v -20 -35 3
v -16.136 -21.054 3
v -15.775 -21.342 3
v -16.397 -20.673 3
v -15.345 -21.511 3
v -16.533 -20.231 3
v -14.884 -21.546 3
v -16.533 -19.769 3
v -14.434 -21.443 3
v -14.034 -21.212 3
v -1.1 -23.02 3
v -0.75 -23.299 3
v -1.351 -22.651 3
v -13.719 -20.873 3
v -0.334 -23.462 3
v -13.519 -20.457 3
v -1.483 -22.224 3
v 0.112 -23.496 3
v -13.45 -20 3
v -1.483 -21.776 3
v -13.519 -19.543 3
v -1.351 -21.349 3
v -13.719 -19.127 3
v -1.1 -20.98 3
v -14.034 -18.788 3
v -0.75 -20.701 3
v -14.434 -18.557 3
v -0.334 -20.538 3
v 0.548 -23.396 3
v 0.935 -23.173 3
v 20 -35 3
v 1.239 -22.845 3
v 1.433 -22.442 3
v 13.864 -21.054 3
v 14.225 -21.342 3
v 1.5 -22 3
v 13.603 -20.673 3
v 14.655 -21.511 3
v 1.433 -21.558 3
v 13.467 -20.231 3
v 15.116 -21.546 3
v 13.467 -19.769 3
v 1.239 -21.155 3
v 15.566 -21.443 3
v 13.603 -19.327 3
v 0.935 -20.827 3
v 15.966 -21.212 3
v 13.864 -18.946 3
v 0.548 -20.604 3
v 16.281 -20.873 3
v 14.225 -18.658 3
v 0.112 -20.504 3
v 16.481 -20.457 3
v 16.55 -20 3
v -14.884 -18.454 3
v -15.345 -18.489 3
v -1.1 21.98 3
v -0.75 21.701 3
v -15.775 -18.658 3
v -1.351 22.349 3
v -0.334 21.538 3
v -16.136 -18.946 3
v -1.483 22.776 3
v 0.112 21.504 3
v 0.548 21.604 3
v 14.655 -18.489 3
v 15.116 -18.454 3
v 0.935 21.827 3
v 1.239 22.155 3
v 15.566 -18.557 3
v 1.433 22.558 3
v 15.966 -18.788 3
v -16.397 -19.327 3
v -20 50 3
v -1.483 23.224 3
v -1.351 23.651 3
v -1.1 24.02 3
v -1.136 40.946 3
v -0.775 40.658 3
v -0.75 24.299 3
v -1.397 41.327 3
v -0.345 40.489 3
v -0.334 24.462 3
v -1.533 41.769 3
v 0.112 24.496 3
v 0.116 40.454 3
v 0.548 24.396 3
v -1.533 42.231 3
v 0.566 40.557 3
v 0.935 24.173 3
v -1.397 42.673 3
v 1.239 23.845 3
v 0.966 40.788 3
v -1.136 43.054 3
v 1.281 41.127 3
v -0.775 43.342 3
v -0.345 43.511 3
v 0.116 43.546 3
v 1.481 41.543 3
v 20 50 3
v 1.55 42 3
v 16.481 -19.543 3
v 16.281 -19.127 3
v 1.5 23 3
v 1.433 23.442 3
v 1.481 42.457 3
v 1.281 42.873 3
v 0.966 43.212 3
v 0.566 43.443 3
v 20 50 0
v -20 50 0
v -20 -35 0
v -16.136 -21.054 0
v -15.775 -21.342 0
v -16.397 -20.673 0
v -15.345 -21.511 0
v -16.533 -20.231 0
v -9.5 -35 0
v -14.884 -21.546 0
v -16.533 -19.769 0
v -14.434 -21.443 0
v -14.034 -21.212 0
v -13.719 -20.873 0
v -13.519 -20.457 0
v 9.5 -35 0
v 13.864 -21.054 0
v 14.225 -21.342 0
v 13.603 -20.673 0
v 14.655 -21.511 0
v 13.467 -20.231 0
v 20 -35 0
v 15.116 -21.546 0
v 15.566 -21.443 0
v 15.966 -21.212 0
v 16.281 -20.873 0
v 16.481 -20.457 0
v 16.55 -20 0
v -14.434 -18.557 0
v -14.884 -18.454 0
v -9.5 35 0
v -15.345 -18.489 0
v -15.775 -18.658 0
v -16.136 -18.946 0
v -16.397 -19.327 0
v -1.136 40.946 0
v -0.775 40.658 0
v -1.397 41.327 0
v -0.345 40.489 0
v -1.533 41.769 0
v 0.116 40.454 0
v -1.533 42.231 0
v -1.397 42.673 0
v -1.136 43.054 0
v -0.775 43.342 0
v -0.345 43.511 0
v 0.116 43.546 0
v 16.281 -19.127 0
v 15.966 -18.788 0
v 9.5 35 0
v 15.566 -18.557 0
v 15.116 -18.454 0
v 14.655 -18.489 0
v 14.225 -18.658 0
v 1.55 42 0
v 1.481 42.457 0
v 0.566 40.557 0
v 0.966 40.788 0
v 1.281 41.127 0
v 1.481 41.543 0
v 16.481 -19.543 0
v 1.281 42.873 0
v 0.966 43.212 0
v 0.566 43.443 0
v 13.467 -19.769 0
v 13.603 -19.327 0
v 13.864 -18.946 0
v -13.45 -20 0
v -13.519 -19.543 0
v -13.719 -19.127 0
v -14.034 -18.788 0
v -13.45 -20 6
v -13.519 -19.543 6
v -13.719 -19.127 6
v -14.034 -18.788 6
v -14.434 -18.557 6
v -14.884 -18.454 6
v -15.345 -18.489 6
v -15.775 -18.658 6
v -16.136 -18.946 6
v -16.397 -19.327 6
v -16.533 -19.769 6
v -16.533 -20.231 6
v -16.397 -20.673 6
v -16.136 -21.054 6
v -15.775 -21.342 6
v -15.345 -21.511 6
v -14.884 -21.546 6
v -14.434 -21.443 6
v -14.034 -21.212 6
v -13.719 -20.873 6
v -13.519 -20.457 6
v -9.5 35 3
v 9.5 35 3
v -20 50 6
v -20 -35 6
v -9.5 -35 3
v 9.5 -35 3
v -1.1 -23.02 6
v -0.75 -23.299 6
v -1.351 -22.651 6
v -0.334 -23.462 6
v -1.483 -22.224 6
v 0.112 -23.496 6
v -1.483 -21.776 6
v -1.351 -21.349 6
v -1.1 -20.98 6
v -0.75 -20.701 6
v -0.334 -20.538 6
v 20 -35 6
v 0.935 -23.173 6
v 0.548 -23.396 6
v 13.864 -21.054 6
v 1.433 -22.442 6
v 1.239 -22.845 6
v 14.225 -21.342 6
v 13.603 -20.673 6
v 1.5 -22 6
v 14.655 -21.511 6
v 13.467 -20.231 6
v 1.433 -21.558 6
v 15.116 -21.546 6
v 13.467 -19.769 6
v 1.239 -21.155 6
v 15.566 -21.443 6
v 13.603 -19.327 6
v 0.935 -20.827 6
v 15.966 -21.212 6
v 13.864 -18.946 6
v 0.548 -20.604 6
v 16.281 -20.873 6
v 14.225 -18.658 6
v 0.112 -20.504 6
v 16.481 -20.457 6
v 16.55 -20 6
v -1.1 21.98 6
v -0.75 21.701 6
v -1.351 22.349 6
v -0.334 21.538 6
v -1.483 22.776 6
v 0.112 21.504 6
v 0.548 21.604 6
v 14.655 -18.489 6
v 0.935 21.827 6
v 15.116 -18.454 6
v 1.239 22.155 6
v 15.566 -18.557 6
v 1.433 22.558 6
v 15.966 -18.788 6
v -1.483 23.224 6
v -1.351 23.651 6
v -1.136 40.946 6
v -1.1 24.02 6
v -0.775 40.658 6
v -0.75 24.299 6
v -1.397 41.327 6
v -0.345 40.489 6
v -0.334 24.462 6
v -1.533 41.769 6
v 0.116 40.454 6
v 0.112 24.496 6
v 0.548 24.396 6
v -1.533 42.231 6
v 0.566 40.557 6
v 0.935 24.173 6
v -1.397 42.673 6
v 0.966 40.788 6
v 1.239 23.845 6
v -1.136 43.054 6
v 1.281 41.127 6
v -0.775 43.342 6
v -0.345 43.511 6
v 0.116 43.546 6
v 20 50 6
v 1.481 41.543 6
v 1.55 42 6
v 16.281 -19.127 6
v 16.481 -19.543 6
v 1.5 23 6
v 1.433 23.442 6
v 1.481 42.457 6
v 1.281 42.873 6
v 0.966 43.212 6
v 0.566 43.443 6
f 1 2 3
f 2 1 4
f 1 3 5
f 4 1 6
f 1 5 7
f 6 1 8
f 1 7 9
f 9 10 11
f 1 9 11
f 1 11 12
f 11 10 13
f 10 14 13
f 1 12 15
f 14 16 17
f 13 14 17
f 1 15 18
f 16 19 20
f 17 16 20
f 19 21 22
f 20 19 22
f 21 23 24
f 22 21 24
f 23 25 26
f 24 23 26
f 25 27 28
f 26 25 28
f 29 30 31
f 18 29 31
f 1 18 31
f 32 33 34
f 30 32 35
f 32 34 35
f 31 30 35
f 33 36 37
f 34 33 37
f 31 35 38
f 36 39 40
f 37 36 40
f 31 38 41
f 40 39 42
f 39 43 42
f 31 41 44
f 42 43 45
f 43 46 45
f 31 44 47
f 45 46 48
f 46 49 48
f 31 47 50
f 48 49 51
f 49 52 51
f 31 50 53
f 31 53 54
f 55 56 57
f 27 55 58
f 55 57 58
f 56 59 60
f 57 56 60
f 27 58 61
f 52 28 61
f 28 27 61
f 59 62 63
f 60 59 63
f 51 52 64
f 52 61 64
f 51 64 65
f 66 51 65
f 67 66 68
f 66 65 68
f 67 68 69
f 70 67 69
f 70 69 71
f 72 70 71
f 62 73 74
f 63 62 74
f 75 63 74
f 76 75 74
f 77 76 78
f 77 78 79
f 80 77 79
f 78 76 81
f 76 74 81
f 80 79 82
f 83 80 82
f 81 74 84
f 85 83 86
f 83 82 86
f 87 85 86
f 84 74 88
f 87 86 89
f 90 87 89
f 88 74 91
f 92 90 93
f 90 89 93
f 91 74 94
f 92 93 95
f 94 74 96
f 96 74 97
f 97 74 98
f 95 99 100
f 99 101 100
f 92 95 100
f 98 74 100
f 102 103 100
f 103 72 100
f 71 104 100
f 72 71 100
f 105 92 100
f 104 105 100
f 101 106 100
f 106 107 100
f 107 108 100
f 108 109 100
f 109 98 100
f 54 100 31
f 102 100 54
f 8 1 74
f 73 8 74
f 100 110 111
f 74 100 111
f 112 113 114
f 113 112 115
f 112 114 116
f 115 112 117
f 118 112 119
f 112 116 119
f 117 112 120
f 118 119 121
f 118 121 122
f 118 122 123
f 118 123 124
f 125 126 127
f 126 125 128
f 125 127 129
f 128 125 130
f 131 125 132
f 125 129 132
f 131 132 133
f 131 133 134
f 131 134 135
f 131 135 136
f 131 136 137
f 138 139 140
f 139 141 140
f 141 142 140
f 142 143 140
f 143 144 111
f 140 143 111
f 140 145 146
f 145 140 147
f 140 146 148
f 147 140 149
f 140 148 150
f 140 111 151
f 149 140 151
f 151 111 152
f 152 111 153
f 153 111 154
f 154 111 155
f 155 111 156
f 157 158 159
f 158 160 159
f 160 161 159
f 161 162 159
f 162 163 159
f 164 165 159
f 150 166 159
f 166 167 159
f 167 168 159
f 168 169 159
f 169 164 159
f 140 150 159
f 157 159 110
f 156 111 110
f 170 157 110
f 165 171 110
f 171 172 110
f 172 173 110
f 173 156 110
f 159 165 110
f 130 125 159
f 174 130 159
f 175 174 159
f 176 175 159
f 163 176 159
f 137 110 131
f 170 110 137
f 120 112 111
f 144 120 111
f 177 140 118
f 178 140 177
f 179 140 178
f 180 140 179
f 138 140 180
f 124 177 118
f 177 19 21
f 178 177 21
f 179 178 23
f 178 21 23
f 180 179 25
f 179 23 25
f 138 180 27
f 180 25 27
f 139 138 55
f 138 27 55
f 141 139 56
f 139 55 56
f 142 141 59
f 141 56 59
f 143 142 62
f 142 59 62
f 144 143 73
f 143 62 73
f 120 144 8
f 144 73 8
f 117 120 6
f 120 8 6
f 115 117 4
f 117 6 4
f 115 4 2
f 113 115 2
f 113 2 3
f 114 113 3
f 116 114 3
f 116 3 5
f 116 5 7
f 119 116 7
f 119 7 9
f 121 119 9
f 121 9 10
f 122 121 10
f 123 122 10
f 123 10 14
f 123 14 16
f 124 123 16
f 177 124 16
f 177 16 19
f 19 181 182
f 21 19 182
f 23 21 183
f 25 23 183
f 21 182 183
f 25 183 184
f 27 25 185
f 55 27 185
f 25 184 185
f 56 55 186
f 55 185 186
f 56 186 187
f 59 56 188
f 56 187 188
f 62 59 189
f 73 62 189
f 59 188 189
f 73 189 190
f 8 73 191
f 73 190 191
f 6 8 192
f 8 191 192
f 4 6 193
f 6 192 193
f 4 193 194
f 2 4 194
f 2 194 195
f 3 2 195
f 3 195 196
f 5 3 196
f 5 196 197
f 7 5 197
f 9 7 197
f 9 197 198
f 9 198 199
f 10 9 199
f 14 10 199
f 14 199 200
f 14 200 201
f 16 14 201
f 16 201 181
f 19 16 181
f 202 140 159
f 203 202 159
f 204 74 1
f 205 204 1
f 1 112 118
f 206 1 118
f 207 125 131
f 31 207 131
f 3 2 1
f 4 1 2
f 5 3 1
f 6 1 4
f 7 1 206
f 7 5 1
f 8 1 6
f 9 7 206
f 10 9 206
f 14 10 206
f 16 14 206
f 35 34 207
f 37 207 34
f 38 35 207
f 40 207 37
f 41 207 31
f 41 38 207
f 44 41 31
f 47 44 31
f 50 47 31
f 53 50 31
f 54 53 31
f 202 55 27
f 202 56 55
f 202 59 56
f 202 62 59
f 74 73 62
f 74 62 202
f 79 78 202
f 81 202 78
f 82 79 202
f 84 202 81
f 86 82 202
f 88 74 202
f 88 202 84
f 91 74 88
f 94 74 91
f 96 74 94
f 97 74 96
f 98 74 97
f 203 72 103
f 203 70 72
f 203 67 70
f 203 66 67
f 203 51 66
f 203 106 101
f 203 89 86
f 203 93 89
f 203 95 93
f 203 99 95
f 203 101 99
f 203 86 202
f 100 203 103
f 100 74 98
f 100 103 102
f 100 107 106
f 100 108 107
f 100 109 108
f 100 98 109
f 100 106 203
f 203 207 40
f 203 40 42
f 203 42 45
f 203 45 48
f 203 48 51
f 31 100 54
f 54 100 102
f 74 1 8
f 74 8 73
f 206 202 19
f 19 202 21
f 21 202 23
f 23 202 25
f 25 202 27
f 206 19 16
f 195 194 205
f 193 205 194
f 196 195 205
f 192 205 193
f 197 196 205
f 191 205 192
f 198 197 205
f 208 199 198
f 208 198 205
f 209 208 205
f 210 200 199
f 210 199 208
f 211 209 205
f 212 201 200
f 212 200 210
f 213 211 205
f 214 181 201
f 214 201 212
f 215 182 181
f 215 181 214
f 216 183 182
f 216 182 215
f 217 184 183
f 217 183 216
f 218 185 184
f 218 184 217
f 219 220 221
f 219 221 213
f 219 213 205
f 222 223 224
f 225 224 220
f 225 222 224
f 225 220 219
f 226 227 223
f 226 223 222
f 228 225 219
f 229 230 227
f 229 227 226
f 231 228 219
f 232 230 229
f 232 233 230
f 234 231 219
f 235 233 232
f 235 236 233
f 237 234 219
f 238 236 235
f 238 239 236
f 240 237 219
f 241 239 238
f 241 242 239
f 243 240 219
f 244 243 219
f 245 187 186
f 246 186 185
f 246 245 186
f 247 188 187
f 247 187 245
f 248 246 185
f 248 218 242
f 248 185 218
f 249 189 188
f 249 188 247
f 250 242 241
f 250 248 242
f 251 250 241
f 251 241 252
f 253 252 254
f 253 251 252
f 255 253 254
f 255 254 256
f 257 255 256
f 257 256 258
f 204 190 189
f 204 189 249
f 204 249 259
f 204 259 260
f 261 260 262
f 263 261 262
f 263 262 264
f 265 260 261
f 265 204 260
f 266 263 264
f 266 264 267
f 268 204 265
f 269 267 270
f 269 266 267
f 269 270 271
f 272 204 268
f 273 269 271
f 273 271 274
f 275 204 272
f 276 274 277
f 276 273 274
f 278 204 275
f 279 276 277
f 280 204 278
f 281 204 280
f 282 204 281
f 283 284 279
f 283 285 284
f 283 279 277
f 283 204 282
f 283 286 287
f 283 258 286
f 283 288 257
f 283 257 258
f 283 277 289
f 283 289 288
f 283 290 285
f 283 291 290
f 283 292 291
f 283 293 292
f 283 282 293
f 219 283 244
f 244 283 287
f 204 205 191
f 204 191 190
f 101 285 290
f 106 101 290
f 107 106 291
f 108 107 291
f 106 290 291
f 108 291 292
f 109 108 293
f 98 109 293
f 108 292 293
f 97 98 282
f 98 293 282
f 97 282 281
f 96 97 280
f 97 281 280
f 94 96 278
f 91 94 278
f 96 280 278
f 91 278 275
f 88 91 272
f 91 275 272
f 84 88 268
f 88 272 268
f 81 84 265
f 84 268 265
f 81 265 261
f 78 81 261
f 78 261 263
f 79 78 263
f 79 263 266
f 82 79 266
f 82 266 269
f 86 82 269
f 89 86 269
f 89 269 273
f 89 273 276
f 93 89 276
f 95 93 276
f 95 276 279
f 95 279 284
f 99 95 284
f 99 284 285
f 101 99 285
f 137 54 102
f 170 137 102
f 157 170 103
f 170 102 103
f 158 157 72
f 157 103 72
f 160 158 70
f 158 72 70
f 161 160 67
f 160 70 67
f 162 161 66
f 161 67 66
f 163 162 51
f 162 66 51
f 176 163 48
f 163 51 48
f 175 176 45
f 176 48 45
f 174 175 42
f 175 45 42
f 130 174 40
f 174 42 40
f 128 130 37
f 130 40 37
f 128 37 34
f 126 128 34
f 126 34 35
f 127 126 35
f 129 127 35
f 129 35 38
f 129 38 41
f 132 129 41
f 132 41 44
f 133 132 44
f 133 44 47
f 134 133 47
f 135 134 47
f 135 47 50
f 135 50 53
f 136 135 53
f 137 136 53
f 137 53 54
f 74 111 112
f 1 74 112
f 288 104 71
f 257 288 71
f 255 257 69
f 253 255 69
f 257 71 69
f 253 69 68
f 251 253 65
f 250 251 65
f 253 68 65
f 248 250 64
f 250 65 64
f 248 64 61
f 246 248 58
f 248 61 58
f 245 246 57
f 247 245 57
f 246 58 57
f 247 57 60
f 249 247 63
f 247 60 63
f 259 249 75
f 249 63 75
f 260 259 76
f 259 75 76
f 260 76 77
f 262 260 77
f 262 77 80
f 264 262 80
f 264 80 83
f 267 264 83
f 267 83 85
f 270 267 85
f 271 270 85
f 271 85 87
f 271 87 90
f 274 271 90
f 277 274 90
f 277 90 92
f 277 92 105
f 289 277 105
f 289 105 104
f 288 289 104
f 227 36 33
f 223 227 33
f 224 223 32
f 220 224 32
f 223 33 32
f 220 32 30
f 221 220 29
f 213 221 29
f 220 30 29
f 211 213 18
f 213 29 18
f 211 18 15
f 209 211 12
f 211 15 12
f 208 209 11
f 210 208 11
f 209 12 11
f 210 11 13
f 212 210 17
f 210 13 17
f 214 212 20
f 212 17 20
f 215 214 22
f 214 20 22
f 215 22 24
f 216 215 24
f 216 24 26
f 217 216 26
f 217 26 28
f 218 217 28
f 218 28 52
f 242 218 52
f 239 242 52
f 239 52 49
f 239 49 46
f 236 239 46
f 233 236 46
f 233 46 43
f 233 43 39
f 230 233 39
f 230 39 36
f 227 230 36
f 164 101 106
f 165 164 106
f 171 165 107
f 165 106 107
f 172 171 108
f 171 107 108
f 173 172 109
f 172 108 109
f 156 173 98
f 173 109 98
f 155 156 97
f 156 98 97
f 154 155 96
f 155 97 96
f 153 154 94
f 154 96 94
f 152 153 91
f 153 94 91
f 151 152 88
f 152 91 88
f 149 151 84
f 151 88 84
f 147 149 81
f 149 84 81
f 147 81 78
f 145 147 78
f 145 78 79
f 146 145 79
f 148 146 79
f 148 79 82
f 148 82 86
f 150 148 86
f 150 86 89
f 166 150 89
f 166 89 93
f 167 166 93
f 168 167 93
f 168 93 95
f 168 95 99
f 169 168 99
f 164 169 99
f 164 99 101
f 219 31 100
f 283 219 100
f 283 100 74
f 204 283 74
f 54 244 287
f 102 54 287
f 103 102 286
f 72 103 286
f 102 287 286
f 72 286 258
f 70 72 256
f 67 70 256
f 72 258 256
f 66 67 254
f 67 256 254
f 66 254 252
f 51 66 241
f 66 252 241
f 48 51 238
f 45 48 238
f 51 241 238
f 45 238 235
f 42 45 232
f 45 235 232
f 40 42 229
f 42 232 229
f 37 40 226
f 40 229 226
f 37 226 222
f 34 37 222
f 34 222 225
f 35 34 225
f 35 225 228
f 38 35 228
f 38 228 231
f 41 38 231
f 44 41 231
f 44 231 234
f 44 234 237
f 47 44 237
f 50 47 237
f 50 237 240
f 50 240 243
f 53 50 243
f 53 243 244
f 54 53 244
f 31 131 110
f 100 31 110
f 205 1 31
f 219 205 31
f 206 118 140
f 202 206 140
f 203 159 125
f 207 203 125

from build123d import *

# Parameters (mm, degrees)
F1_DEPTH = 3
F2_W     = 19
F2_H     = 70
F3_DEPTH = 3
F4_R     = 1.55
F5_DEPTH = 25
F6_R     = 1.5
F7_DEPTH = 25


with BuildPart() as f1:
    # F0 (on Top) → F1 (new body)
    with BuildSketch(Plane.XY):
        Polygon((-9.5, 35), (9.5, 35), (9.5, -35), (20, -35), (20, 50), (-20, 50), (-20, -35), (-9.5, -35), align=None)
    extrude(amount=F1_DEPTH)


with BuildPart() as f3:
    # F2 (on face) → F3 (new body)
    with BuildSketch(Plane.XY.offset(3)):
        Polygon((20, -35), (20, 50), (-20, 50), (-20, -35), (-9.5, -35), (-9.5, 35), (9.5, 35), (9.5, -35), align=None)
        Rectangle(F2_W, F2_H)
    extrude(amount=F3_DEPTH)


with BuildPart() as f5_tool:
    # F4 (on face) → F5 (new body)
    with BuildSketch(Plane.XY.offset(6)):
        with Locations((-15, -20)):
            Circle(F4_R)
        with Locations((15, -20)):
            Circle(F4_R)
        with Locations((0, 42)):
            Circle(F4_R)
    extrude(amount=-F5_DEPTH)


with BuildPart() as f1_1:
    add(f1.part)

    # F5: cut by f5_tool
    add(f5_tool.part, mode=Mode.SUBTRACT)


with BuildPart() as f3_1:
    add(f3.part)

    # F5: cut by f5_tool
    add(f5_tool.part, mode=Mode.SUBTRACT)

    # F6 (on face) → F7 (cut)
    with BuildSketch(Plane(origin=(0, 0, 3), x_dir=(1, 0, 0), z_dir=(0, 0, -1))):
        with Locations((0, -23)):
            Circle(F6_R)
        with Locations((0, 22)):
            Circle(F6_R)
    extrude(amount=-F7_DEPTH, mode=Mode.SUBTRACT)


solid = Compound([f1_1.part, f3_1.part])
